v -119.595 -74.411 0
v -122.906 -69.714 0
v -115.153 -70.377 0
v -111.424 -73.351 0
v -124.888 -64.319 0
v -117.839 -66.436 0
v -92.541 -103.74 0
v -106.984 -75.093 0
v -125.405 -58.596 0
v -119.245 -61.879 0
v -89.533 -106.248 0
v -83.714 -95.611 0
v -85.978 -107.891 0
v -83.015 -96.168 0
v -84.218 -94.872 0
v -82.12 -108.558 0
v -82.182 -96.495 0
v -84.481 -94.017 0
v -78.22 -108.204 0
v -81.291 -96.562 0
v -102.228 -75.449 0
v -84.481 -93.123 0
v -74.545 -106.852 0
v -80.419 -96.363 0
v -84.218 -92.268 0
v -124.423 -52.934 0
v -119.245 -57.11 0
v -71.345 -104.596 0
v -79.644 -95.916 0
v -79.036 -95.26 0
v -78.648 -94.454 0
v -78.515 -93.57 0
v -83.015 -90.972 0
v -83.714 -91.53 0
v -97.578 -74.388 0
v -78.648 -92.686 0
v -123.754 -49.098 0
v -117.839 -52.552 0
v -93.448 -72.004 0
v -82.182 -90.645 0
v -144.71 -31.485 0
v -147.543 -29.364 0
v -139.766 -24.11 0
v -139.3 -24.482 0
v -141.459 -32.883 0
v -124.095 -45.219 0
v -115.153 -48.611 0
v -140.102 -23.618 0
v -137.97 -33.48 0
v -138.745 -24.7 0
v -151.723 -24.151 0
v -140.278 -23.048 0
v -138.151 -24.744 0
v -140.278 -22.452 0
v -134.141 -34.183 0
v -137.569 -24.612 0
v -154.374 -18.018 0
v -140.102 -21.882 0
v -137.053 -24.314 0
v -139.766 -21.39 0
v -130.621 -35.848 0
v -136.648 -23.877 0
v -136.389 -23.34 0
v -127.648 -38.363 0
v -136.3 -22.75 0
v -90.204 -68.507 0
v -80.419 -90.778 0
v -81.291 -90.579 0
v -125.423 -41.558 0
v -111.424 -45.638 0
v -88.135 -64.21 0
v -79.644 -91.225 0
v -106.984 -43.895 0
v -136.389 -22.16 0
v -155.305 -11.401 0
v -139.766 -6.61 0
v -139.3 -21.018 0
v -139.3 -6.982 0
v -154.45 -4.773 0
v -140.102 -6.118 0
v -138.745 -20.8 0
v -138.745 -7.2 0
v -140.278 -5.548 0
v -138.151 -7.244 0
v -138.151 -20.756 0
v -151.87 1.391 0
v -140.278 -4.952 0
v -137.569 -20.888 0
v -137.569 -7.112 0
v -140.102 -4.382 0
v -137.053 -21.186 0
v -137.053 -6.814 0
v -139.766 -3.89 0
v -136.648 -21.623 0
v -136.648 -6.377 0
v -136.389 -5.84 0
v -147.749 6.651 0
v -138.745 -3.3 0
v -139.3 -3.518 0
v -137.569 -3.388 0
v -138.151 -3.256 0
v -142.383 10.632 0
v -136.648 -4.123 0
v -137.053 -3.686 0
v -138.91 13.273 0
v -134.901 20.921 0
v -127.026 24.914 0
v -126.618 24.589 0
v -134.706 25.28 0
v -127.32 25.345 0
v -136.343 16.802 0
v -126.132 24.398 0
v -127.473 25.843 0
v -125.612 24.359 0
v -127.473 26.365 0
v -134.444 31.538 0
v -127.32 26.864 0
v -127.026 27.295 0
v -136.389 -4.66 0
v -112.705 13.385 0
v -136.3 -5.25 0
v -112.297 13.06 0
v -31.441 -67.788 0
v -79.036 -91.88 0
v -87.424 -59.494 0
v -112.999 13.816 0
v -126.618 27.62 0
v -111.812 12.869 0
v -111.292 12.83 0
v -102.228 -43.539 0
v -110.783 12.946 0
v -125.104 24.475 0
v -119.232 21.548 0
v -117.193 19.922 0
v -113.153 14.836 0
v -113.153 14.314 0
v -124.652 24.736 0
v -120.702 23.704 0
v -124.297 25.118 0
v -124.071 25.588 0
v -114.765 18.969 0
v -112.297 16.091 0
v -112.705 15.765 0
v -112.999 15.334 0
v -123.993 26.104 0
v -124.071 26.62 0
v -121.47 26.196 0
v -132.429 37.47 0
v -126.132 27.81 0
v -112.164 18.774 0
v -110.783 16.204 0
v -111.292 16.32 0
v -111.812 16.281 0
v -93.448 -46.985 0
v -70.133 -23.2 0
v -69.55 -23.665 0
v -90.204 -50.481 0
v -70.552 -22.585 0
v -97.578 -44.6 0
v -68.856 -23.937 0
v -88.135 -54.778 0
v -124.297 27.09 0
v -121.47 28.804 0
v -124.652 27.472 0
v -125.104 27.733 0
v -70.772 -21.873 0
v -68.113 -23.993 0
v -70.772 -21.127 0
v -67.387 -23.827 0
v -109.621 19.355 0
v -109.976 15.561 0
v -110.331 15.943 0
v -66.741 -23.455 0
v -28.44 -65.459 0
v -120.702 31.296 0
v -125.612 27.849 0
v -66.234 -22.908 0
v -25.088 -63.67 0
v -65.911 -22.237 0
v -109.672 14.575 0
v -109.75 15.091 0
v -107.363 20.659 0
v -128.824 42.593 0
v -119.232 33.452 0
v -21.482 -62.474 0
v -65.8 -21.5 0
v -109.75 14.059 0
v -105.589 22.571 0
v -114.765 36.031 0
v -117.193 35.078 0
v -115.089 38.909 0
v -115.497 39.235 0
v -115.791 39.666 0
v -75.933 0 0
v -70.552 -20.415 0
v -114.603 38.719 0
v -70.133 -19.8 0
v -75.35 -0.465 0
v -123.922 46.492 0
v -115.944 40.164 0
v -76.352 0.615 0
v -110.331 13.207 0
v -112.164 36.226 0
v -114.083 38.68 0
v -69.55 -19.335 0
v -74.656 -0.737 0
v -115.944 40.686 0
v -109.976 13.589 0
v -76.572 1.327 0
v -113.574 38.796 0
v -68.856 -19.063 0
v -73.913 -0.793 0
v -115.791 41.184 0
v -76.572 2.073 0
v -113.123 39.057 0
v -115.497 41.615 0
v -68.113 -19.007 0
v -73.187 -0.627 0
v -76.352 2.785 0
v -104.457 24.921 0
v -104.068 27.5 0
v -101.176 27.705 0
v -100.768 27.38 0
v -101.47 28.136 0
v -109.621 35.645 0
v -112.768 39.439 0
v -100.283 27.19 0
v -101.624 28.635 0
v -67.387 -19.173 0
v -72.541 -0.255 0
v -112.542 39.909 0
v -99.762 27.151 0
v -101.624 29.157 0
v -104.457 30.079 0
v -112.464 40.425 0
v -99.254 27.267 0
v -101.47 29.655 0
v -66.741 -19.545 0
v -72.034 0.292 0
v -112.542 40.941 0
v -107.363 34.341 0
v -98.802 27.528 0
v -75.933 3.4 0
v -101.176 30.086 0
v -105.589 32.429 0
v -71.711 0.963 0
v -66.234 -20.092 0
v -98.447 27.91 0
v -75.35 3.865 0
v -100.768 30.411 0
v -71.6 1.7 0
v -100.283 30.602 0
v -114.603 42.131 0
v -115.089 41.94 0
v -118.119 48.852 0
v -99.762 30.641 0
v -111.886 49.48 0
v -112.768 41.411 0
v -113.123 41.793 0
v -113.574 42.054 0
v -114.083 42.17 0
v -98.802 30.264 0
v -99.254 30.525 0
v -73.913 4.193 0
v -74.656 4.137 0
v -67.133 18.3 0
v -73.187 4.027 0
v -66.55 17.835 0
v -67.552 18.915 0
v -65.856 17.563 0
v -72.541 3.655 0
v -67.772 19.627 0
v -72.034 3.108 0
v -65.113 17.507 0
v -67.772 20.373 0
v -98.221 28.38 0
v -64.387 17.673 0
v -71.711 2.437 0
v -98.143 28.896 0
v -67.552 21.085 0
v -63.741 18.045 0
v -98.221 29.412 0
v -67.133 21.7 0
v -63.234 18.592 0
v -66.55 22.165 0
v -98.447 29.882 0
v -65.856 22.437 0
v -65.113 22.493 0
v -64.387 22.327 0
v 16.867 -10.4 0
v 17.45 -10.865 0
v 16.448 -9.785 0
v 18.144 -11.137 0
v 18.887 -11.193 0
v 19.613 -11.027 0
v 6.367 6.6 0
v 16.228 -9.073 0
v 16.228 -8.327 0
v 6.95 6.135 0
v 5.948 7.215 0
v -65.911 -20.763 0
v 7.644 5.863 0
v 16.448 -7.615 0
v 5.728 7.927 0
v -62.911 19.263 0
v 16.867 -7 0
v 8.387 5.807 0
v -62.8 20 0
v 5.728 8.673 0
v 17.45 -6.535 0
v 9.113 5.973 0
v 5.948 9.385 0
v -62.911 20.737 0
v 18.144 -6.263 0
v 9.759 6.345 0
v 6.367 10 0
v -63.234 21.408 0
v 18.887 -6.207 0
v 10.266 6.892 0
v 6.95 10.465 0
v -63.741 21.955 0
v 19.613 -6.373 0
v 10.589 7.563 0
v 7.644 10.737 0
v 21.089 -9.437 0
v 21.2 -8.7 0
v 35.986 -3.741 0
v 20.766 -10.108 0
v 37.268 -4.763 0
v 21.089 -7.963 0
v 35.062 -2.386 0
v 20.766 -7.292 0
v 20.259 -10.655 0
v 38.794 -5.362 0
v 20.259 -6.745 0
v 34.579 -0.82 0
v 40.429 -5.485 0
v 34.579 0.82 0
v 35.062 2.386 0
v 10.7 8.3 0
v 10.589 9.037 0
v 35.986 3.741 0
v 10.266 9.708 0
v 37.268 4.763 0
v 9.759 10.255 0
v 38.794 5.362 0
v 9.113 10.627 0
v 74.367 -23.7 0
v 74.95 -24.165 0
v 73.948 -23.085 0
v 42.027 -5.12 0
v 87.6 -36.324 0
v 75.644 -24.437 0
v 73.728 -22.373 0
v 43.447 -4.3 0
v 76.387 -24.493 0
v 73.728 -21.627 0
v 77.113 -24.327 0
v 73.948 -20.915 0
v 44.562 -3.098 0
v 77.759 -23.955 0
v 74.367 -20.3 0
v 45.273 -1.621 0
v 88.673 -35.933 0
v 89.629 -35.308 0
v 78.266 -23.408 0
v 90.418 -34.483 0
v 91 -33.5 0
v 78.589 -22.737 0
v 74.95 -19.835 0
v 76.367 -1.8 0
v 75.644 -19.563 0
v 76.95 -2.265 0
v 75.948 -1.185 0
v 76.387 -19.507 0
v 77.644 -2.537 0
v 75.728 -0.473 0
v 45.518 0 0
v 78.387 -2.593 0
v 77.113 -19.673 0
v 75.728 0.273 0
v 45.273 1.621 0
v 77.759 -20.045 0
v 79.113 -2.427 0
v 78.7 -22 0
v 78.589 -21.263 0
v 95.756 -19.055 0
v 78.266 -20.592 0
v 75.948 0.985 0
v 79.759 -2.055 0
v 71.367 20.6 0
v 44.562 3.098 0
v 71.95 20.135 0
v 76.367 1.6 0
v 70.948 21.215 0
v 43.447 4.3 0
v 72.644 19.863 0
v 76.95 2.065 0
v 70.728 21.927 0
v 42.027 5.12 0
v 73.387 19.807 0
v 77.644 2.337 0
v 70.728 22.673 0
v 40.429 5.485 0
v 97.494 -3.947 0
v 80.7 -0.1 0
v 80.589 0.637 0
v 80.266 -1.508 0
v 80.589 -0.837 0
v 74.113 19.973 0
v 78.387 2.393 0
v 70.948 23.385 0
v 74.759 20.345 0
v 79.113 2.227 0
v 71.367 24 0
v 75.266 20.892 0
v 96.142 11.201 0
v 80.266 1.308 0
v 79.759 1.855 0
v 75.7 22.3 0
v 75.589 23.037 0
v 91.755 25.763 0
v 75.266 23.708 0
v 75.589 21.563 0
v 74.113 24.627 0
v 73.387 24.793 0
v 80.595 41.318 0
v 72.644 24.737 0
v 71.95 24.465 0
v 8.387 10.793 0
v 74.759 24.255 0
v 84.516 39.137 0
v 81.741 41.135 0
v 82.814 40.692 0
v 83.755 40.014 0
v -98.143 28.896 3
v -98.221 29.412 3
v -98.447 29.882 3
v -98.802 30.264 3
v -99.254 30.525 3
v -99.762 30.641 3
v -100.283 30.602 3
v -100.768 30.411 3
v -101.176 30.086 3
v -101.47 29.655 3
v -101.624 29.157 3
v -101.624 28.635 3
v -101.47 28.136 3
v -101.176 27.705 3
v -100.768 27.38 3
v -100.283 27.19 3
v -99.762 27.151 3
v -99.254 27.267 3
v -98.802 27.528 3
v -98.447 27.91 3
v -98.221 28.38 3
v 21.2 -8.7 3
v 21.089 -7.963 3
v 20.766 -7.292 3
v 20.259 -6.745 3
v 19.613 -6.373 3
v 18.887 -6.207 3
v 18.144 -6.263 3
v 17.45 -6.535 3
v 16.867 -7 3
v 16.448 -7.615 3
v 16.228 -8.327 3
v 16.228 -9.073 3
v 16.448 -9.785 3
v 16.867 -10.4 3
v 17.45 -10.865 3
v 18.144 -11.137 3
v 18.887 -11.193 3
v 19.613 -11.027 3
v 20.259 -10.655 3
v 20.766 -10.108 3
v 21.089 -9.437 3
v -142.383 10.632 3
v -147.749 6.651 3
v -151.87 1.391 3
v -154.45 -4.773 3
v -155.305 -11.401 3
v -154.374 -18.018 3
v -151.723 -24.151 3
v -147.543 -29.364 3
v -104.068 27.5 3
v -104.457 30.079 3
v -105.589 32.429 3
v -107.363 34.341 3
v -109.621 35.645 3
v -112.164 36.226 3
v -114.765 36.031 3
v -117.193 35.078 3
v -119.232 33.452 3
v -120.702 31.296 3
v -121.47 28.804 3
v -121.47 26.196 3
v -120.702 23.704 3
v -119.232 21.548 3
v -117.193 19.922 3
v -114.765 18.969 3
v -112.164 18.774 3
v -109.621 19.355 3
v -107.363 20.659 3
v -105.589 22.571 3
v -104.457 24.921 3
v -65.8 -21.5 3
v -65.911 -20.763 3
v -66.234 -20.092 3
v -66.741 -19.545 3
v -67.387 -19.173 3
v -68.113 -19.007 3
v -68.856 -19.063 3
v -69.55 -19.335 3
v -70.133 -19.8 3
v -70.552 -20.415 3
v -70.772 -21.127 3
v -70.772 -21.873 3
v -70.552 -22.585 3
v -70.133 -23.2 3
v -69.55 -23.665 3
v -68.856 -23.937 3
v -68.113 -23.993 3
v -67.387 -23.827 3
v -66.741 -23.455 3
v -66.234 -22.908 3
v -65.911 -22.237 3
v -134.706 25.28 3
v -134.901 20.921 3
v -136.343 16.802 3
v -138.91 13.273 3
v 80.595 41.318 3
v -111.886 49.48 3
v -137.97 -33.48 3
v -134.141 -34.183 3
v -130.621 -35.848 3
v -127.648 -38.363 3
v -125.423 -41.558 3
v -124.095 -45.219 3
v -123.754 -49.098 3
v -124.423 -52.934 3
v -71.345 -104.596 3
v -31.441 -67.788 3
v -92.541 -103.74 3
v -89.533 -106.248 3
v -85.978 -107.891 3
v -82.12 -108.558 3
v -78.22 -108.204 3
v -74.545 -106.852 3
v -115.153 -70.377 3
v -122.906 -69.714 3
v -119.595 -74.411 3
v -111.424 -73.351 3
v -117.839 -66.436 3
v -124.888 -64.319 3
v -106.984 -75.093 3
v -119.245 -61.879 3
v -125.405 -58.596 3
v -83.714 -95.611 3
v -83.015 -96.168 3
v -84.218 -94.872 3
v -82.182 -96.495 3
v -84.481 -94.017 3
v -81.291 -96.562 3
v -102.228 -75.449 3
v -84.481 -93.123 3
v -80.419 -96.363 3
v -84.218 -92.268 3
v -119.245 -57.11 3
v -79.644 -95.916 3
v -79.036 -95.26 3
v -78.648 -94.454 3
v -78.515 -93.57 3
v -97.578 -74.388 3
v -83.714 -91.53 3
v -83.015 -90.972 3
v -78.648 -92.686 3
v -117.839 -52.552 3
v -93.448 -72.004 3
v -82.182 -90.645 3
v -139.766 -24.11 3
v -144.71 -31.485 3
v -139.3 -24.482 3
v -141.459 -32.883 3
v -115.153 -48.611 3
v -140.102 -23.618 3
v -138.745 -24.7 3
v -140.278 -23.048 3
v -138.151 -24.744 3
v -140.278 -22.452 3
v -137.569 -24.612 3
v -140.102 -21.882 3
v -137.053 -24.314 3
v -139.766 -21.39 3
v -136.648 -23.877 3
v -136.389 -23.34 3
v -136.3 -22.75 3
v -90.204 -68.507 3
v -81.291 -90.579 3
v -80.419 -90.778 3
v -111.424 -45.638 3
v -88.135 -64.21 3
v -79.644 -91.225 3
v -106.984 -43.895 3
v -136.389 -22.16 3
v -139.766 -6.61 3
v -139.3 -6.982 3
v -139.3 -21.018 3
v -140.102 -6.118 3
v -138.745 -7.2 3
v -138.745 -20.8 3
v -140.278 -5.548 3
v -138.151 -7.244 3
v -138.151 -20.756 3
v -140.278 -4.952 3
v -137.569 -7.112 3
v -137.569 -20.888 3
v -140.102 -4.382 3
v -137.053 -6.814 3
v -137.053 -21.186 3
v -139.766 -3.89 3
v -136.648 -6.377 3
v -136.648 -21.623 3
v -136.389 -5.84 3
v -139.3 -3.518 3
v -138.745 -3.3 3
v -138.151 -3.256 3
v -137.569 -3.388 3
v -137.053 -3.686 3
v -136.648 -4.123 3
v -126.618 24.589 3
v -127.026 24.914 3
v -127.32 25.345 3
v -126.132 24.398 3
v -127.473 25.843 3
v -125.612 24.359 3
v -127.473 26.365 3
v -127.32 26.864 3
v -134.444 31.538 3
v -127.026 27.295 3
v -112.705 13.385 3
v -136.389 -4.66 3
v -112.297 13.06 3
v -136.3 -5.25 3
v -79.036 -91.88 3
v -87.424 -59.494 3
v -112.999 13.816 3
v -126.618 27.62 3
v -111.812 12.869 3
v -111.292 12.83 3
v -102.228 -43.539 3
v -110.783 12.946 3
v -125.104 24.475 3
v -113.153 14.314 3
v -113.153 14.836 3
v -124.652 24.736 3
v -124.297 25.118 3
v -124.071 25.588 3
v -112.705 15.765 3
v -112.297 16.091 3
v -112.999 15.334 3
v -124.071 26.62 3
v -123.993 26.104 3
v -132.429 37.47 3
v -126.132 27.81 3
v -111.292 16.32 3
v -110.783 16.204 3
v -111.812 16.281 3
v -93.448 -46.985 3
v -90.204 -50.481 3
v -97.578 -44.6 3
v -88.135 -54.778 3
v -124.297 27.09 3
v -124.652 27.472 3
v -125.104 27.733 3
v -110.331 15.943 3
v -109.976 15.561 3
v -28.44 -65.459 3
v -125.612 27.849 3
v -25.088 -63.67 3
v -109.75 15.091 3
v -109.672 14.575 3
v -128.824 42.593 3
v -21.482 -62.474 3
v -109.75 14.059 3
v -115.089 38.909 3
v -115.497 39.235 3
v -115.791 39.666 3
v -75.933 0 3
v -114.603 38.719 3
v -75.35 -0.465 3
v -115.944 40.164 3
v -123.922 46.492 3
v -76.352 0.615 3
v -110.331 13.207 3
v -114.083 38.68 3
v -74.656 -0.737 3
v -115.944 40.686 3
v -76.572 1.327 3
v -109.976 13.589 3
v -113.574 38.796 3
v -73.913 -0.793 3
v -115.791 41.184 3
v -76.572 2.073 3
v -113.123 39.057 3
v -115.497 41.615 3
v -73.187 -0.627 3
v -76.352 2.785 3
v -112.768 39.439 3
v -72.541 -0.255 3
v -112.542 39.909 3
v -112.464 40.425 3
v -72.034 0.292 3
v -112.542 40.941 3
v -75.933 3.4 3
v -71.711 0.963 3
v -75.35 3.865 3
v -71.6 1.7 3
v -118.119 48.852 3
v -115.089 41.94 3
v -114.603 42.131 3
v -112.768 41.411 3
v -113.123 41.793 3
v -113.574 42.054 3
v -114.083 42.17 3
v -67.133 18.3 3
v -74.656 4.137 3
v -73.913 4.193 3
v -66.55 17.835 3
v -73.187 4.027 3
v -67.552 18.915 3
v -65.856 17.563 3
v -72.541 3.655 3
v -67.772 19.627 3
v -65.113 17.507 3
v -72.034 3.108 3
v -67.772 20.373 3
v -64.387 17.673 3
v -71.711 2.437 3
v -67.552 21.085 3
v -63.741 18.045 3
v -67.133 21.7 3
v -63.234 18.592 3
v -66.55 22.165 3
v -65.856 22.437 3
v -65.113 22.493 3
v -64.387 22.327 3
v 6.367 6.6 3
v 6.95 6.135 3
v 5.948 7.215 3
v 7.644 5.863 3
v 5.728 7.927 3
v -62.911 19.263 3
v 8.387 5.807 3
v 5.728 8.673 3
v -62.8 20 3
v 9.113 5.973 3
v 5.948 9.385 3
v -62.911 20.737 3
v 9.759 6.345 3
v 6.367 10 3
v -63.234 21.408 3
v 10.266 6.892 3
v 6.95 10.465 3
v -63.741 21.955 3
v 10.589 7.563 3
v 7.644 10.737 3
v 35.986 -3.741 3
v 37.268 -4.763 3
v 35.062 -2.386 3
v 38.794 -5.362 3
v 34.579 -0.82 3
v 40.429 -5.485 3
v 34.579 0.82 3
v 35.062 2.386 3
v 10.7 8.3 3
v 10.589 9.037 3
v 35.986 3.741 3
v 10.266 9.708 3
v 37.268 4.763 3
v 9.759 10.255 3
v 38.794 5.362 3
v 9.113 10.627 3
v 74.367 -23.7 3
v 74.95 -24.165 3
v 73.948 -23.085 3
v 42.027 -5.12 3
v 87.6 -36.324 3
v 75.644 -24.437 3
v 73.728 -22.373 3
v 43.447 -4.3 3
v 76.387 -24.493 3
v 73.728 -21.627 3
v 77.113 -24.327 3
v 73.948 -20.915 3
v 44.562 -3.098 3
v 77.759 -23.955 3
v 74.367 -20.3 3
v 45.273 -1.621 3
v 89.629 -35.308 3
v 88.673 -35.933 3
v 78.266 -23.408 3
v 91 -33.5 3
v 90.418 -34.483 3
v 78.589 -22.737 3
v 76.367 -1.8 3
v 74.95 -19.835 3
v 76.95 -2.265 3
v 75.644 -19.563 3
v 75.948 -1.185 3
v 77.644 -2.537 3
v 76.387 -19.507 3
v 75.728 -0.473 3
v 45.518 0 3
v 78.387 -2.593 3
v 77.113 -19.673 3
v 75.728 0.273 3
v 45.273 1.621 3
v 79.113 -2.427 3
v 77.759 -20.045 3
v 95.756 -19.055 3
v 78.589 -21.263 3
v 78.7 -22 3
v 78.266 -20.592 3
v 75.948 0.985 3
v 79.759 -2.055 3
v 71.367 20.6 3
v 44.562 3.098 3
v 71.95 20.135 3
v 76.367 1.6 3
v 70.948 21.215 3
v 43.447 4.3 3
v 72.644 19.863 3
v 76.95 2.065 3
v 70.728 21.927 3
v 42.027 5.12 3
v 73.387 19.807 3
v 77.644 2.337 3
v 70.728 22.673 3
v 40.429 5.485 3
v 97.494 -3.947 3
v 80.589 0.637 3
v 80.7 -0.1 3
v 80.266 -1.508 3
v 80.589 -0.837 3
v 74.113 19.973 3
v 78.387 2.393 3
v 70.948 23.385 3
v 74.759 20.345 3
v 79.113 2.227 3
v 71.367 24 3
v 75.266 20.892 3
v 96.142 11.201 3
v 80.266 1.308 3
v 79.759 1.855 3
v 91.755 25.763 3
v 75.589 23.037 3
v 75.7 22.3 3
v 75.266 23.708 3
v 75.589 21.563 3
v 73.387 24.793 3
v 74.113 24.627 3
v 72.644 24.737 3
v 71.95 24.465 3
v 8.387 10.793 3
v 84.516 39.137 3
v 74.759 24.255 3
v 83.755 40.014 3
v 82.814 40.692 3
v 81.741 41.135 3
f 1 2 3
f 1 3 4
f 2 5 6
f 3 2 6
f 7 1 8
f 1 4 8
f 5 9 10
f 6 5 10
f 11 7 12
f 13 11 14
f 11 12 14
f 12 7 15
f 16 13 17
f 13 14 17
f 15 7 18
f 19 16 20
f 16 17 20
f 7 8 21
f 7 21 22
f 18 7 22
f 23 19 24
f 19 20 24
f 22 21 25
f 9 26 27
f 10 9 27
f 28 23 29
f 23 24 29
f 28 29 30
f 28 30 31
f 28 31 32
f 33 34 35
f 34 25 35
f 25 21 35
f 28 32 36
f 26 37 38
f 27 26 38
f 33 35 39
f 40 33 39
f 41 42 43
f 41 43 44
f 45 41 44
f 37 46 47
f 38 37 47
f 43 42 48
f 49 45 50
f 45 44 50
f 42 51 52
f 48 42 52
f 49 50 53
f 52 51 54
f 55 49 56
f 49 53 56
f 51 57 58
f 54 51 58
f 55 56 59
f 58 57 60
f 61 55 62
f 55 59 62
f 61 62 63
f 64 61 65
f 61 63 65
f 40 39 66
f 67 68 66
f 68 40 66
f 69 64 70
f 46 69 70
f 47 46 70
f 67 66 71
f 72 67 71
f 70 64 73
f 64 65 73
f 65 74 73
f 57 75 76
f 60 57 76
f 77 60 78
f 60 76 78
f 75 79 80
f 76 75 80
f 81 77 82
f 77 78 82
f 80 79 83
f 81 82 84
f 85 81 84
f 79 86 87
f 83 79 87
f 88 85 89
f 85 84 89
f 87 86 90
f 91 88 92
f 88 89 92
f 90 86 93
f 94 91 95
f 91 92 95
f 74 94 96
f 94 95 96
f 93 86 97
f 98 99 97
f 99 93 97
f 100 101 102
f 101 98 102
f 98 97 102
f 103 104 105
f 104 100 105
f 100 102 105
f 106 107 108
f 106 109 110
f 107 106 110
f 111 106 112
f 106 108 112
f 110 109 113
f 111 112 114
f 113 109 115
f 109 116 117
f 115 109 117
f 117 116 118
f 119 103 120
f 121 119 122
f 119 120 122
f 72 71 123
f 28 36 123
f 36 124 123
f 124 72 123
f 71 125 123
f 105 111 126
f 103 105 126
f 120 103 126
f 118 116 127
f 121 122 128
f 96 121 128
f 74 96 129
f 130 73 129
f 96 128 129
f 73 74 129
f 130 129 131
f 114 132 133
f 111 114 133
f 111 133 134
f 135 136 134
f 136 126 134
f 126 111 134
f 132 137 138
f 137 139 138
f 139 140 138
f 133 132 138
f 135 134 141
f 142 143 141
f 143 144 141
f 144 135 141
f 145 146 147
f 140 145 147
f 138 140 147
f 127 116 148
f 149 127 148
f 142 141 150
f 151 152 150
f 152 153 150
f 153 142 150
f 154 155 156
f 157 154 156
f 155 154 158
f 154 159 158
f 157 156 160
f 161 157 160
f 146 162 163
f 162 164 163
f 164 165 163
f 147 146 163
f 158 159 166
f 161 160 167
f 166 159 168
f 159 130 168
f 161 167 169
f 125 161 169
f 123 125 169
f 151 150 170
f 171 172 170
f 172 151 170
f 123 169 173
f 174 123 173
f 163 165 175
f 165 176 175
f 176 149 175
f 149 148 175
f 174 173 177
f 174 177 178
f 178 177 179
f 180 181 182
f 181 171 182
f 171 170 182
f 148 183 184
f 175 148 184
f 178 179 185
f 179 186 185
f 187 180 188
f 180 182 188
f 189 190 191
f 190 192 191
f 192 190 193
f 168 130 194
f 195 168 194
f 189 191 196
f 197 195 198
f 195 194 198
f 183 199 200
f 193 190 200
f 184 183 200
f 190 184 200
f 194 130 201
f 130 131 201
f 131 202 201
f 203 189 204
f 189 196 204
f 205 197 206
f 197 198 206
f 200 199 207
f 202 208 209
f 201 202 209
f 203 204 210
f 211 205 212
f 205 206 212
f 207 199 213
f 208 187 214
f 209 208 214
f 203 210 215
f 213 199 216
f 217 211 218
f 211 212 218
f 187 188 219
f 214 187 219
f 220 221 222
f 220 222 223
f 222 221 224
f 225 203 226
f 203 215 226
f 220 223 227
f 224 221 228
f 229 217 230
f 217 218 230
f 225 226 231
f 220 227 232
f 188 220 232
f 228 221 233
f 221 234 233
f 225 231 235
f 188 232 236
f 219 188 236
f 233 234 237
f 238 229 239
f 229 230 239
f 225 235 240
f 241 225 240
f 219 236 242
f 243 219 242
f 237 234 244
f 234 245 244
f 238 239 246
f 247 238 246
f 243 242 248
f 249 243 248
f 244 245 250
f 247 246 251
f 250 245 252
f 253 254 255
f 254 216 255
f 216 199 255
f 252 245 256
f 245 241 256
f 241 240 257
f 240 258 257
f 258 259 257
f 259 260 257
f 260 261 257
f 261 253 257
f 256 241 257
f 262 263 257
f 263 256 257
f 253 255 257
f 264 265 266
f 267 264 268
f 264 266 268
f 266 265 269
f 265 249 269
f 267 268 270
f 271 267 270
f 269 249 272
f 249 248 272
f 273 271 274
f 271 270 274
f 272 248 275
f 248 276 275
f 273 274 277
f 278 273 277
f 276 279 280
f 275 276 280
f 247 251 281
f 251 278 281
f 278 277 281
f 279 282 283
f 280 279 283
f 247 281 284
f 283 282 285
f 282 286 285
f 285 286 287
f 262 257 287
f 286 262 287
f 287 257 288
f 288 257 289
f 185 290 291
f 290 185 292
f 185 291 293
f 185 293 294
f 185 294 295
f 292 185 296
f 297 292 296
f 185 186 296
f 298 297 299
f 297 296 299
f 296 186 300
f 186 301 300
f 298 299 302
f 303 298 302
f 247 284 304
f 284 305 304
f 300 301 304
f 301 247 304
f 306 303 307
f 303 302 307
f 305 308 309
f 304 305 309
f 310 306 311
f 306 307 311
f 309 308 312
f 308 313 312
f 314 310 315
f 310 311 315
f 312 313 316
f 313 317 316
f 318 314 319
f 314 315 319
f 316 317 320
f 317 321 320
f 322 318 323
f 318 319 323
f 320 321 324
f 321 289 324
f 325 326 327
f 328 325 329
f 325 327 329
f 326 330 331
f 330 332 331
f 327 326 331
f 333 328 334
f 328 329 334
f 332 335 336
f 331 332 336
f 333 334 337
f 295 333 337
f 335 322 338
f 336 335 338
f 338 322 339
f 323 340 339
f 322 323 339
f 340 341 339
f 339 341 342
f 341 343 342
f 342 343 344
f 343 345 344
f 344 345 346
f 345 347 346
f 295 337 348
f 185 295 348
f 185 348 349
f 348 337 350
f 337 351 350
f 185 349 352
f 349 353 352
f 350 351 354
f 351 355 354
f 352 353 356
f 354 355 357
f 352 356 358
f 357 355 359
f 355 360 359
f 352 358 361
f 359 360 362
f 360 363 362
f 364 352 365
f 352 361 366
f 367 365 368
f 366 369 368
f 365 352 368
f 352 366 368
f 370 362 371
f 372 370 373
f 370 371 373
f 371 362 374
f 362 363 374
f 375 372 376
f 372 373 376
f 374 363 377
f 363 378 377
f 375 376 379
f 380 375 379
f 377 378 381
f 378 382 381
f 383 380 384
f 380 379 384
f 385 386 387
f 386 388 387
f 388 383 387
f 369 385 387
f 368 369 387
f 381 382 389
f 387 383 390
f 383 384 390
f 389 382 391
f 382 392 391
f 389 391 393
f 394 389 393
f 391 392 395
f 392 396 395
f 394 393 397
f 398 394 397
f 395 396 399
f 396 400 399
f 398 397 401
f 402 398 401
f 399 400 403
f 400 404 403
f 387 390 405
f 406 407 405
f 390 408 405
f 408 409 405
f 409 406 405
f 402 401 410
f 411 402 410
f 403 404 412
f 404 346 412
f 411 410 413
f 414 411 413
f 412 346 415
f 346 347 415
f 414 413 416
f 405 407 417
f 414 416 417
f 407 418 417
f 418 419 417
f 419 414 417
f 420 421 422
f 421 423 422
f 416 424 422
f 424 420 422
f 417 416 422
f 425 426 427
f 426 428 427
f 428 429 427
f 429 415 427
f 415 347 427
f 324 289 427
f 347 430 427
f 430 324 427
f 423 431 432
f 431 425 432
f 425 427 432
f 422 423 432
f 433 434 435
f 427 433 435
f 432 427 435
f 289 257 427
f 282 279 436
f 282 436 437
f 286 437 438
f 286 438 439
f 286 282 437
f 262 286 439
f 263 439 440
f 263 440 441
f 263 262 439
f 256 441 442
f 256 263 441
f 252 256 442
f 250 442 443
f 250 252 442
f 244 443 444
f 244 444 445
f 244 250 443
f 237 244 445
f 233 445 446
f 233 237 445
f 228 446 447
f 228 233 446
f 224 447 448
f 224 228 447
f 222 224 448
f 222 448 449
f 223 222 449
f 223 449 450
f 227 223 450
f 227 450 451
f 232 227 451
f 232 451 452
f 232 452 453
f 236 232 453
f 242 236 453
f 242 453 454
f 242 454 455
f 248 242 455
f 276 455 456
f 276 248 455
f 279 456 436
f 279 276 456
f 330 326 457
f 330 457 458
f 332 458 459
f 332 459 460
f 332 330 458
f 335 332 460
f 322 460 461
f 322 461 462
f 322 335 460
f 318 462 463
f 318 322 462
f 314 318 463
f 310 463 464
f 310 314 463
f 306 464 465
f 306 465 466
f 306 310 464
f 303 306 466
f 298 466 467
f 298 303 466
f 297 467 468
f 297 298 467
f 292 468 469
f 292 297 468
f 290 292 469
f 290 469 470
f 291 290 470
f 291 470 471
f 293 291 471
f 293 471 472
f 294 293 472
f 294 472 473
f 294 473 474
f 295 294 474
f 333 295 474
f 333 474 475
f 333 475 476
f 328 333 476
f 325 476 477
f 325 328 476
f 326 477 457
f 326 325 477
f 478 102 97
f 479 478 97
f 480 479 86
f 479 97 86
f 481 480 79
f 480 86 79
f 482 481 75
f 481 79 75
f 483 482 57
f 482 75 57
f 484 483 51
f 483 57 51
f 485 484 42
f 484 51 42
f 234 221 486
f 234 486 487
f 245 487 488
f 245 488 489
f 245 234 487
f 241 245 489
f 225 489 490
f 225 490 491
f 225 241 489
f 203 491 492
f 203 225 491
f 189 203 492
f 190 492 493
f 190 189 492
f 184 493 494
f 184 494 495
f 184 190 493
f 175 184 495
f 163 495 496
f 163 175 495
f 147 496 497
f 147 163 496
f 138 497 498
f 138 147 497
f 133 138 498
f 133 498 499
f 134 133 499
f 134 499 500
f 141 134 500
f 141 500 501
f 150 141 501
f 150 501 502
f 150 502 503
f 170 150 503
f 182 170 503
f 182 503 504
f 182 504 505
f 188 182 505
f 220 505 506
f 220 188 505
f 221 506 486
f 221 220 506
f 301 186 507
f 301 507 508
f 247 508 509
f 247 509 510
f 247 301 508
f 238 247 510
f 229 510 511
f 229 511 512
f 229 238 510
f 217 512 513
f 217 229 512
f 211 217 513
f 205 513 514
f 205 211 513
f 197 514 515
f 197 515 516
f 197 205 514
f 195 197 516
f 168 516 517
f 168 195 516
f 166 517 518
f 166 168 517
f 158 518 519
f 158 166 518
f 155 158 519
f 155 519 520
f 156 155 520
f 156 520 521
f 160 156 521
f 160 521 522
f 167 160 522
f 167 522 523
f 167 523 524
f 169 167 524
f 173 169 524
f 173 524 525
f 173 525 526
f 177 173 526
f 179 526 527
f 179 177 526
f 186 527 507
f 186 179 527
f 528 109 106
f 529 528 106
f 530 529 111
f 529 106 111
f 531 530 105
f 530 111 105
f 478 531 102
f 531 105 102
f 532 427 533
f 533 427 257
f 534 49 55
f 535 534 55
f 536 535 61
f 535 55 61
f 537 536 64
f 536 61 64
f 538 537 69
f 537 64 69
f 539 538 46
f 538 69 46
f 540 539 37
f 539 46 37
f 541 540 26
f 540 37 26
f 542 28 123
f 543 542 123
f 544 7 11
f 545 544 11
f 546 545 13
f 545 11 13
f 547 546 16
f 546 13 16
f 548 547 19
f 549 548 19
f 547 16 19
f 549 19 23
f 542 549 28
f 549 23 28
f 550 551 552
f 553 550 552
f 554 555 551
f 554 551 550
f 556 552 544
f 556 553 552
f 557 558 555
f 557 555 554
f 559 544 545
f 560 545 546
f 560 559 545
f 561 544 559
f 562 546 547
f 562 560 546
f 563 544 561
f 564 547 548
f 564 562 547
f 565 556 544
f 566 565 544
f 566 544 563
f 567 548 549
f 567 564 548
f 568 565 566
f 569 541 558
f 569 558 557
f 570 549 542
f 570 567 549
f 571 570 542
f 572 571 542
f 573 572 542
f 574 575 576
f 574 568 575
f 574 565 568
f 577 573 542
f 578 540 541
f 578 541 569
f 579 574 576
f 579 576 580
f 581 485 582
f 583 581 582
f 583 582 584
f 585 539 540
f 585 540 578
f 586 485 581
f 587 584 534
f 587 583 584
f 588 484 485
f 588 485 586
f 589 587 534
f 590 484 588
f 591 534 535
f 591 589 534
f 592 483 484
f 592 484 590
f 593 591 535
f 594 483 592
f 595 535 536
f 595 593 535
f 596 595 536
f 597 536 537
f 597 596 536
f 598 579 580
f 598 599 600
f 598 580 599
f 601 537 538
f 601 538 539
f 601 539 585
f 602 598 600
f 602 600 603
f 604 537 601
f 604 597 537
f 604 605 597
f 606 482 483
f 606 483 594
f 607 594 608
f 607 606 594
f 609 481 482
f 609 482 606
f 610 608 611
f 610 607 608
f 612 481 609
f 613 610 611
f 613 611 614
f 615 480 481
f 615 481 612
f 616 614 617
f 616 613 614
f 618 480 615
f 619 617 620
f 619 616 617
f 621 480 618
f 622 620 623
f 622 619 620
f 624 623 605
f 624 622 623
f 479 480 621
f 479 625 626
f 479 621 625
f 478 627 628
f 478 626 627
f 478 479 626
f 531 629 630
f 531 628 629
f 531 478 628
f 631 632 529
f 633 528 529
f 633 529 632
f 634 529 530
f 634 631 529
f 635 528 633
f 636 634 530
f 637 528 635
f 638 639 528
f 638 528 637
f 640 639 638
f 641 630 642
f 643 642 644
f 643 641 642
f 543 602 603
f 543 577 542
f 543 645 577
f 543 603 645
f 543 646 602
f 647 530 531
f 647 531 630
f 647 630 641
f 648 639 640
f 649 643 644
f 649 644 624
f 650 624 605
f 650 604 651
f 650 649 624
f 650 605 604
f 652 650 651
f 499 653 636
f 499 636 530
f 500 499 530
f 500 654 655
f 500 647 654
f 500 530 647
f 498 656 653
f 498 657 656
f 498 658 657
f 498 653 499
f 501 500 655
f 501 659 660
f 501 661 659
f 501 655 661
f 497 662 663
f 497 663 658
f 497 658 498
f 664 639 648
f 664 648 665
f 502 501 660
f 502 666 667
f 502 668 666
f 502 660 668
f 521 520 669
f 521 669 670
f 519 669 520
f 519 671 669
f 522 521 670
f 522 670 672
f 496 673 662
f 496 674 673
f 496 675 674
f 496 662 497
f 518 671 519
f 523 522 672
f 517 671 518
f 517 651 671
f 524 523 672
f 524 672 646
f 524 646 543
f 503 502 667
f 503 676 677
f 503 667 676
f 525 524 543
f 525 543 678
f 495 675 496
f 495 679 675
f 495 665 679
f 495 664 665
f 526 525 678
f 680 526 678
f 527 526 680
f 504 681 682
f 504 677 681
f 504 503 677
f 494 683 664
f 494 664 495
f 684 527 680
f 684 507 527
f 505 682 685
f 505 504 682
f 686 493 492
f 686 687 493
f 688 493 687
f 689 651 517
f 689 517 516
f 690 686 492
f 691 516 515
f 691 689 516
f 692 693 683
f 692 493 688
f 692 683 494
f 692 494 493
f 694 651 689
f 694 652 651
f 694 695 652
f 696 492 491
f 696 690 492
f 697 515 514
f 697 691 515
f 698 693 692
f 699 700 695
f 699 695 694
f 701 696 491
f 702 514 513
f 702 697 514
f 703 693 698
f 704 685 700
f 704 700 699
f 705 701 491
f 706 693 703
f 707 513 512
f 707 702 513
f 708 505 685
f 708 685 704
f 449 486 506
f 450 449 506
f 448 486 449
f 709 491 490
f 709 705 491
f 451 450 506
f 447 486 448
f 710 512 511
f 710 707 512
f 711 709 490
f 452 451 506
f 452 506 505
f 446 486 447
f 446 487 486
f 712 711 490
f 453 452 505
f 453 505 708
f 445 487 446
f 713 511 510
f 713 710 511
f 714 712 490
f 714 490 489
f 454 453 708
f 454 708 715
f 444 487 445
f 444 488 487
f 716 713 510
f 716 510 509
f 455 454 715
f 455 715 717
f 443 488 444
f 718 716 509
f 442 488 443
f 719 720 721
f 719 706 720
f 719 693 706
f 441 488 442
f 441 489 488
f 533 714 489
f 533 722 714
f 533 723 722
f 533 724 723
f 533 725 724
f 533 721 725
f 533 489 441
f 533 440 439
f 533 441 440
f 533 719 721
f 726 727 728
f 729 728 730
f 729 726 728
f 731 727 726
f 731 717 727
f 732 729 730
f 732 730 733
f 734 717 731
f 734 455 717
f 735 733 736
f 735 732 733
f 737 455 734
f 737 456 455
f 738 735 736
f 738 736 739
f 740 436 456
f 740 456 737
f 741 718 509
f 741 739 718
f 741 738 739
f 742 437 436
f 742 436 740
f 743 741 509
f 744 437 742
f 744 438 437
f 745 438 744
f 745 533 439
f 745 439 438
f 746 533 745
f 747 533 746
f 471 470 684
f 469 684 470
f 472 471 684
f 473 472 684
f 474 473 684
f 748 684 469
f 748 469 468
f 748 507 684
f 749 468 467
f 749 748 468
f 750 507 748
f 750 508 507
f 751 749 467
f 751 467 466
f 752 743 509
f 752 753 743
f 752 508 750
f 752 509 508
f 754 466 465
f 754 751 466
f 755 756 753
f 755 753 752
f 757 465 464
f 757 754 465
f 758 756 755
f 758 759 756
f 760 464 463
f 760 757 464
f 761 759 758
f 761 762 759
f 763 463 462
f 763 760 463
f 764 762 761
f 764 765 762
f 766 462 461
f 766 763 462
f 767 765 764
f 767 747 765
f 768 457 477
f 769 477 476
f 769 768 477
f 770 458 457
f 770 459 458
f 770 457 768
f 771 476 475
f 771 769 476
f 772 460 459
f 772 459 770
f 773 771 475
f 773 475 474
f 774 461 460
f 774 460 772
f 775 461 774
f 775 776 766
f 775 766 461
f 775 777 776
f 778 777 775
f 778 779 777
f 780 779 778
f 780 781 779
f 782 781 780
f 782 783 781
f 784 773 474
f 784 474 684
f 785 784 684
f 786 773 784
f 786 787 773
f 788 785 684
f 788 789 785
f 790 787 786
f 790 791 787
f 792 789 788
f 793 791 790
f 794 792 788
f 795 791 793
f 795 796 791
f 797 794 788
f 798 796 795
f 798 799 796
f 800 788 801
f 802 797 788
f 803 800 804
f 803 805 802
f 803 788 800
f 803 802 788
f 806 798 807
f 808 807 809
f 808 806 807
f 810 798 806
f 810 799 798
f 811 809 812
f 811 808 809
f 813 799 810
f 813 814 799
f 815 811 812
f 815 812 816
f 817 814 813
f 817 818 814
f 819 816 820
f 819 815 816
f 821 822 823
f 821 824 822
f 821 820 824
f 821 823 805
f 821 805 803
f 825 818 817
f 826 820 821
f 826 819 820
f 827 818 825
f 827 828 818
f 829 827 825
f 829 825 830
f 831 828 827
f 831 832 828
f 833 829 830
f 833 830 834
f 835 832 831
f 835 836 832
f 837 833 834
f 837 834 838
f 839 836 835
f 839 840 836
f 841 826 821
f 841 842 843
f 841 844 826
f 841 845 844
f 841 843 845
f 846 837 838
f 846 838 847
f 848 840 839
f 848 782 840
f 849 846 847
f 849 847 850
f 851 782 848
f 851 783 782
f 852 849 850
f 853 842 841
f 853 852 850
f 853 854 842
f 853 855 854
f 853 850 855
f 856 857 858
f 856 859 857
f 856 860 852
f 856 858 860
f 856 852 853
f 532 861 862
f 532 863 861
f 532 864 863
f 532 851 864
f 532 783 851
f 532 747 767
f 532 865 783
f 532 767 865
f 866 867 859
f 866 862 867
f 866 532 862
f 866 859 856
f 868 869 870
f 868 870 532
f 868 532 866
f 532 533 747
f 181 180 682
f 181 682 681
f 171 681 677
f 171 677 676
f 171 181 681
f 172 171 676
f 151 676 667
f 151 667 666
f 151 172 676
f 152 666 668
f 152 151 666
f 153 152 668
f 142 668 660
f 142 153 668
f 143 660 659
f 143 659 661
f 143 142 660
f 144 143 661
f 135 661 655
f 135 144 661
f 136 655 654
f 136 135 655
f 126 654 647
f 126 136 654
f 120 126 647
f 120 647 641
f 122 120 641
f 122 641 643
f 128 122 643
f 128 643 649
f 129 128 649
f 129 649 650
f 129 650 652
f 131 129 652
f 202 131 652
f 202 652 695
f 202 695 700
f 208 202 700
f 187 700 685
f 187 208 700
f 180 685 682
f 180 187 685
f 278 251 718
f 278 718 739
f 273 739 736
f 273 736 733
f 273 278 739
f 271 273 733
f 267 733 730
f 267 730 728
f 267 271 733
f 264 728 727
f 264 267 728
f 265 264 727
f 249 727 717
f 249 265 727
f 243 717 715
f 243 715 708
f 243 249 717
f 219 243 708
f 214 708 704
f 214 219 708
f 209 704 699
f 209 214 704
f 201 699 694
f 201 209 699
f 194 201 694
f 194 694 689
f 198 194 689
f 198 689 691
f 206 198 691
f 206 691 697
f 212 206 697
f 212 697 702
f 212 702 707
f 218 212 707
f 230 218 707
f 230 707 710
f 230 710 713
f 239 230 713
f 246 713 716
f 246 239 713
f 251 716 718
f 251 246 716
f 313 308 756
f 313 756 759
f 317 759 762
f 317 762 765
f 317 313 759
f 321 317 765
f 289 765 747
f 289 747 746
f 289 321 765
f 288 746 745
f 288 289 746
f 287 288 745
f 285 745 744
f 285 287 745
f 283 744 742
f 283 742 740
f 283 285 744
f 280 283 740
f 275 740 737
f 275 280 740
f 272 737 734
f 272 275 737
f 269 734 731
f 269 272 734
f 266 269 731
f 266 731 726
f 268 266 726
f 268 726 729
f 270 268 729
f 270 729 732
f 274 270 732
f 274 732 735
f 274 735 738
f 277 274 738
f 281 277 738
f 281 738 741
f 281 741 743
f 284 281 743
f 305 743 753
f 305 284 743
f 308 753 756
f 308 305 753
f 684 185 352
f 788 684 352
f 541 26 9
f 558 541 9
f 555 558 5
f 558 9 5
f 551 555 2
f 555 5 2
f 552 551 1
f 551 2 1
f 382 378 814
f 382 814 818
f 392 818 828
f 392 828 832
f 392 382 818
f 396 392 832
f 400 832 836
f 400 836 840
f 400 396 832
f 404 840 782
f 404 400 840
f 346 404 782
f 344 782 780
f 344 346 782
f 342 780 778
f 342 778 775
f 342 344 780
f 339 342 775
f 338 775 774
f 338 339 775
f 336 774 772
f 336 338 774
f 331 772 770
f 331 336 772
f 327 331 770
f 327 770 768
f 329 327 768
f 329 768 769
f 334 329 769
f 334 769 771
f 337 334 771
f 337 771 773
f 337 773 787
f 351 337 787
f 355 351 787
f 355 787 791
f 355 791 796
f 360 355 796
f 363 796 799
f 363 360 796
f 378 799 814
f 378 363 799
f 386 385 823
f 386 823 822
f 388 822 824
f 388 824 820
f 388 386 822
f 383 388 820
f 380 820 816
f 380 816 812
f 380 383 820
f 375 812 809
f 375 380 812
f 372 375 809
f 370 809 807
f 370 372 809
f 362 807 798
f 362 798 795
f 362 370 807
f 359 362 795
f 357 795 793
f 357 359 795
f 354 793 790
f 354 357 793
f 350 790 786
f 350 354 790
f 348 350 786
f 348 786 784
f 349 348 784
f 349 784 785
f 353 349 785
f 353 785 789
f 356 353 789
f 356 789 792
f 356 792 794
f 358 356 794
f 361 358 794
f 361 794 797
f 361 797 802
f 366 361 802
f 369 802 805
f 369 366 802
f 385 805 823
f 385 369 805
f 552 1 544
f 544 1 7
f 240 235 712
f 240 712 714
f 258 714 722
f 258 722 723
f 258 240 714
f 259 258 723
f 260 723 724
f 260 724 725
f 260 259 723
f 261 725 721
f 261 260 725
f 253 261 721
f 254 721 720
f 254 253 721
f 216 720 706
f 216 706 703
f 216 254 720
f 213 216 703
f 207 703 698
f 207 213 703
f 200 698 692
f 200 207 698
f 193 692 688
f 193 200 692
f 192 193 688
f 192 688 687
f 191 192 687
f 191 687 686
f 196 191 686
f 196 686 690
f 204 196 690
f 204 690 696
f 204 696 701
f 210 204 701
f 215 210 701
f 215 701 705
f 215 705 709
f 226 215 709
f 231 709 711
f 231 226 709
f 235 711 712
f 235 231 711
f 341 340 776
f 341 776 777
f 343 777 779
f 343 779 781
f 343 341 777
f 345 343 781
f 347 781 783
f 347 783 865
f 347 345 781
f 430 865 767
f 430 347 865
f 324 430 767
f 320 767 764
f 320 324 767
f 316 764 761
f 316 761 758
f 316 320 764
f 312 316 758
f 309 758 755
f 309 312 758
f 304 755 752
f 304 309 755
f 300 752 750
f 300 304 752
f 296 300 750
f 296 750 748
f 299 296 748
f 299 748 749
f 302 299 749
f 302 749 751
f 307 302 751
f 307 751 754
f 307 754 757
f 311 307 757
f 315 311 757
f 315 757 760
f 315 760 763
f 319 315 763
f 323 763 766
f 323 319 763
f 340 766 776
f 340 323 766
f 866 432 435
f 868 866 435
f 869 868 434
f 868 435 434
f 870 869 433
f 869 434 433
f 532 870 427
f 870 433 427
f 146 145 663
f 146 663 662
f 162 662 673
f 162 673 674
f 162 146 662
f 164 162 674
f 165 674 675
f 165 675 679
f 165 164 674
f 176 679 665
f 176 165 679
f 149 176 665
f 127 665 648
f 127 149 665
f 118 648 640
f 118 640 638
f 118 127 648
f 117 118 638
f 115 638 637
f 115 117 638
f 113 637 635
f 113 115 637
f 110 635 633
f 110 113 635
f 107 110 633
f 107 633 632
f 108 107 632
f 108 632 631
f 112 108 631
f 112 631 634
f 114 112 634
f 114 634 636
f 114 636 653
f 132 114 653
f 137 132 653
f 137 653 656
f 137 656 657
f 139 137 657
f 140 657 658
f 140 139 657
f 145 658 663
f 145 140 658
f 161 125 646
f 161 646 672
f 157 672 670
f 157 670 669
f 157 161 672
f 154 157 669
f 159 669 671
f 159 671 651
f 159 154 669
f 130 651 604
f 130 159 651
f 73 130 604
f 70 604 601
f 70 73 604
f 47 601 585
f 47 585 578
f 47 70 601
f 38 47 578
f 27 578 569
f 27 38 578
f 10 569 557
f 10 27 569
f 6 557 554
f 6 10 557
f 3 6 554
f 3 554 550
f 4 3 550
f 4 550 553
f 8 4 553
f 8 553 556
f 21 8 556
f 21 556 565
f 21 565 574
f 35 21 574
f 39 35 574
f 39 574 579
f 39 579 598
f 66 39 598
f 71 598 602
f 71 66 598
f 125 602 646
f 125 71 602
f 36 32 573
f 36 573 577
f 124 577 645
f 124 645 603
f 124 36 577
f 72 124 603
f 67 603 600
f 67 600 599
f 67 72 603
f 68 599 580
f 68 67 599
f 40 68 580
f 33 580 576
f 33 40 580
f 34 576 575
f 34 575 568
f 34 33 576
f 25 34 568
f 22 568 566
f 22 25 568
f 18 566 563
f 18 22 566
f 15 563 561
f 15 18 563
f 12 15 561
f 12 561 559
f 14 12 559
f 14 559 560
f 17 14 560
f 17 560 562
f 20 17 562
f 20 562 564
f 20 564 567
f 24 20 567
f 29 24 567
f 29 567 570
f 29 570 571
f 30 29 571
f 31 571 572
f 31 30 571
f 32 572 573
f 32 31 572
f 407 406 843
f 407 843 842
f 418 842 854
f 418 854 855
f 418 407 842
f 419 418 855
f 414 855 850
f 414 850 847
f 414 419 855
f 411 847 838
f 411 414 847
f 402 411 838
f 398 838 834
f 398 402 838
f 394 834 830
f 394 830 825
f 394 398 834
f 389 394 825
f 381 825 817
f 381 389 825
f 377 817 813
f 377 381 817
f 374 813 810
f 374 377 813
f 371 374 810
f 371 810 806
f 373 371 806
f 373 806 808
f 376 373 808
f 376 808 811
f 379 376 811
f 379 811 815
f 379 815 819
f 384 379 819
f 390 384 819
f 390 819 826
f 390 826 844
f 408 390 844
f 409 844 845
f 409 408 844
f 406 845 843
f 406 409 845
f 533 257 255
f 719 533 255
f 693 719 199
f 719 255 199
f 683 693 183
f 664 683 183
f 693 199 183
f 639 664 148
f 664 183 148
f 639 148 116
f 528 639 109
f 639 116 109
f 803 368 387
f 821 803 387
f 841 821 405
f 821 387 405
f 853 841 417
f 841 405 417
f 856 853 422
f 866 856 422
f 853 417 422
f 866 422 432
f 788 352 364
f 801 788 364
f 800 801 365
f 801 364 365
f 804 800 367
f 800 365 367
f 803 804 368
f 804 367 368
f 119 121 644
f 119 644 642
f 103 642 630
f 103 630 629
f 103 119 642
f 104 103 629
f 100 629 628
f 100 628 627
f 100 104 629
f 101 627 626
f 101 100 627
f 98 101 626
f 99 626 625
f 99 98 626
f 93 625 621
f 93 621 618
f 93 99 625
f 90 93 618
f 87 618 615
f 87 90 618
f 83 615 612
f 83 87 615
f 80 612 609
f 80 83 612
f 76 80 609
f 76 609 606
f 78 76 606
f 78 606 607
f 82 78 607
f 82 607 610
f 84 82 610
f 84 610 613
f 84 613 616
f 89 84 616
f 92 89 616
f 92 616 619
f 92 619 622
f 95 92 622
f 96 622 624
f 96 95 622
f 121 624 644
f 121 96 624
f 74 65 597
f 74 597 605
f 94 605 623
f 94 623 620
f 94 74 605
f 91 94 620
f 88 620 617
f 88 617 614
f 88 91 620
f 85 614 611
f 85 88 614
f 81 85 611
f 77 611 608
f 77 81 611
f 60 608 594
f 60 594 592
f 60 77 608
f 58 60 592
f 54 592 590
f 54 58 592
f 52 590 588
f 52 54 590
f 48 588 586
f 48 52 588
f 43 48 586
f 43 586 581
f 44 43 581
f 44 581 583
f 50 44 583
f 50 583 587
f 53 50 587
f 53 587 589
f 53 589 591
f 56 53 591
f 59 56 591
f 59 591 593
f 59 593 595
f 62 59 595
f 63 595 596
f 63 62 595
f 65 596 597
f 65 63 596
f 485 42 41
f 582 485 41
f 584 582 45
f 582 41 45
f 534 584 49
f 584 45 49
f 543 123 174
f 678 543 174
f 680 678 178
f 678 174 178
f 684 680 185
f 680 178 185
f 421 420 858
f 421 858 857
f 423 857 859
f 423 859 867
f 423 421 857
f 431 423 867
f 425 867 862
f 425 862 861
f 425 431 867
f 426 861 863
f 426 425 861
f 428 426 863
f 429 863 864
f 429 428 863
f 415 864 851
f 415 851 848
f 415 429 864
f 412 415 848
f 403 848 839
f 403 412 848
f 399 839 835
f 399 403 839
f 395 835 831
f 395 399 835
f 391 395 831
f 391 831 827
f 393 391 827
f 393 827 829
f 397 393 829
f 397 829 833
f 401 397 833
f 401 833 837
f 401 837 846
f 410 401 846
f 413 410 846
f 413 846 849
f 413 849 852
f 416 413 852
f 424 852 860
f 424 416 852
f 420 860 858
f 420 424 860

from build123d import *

# Parameters (mm, degrees)
SKETCH1_R           = 3
SKETCH1_R_2         = 2
SKETCH1_R_3         = 2.5
SKETCH1_R_4         = 1.75
SKETCH1_R_5         = 8.75
SKETCH1_R_6         = 5.5
SKETCH1_R_7         = 16
BOSS_EXTRUDE1_DEPTH = 3


with BuildPart() as part:
    # Sketch1 → Boss-Extrude1 (new body)
    with BuildSketch(Plane.XY):
        with BuildLine():
            ThreePointArc((-111.886028634, 49.480245878), (-128.824449864, 42.592956949), (-134.705774542, 25.279526249))
            ThreePointArc((-134.705774542, 25.279526249), (-136.343375771, 16.802270376), (-142.382746132, 10.632050724))
            ThreePointArc((-142.382746132, 10.632050724), (-155.099864059, -8.058287742), (-147.542861296, -29.364285714))
            ThreePointArc((-147.542861296, -29.364285714), (-143.125485566, -32.280163581), (-137.970351553, -33.480224156))
            ThreePointArc((-137.970351553, -33.480224156), (-126.431132561, -39.888203569), (-124.422839539, -52.93360637))
            ThreePointArc((-124.422839539, -52.93360637), (-124.888175134, -64.31939994), (-119.594822483, -74.410646153))
            Line((-119.594822483, -74.410646153), (-92.540517723, -103.740413224))
            ThreePointArc((-92.540517723, -103.740413224), (-82.119700521, -108.557935129), (-71.344567605, -104.595807028))
            Line((-71.344567605, -104.595807028), (-31.441449774, -67.788453323))
            ThreePointArc((-31.441449774, -67.788453323), (-26.802171393, -64.493076397), (-21.481893225, -62.473904985))
            Line((-21.481893225, -62.473904985), (87.599861039, -36.324111832))
            ThreePointArc((87.599861039, -36.324111832), (89.628937626, -35.308169791), (91, -33.5))
            ThreePointArc((91, -33.5), (97.203558128, 3.661751943), (84.51565505, 39.137054004))
            ThreePointArc((84.51565505, 39.137054004), (82.813644384, 40.69192784), (80.594954641, 41.317938046))
            Line((80.594954641, 41.317938046), (-111.886028634, 49.480245878))
        make_face()
        with Locations((-81.514845762, -93.570135067)):
            Circle(SKETCH1_R, mode=Mode.SUBTRACT)
        with Locations((-138.3, -22.75)):
            Circle(SKETCH1_R_2, mode=Mode.SUBTRACT)
        with Locations((-138.3, -5.25)):
            Circle(SKETCH1_R_2, mode=Mode.SUBTRACT)
        with Locations((-68.3, -21.5)):
            Circle(SKETCH1_R_3, mode=Mode.SUBTRACT)
        with Locations((-74.1, 1.7)):
            Circle(SKETCH1_R_3, mode=Mode.SUBTRACT)
        with Locations((-111.422396488, 14.575141755)):
            Circle(SKETCH1_R_4, mode=Mode.SUBTRACT)
        with Locations((-125.742976533, 26.1042782)):
            Circle(SKETCH1_R_4, mode=Mode.SUBTRACT)
        with Locations((-112.818118288, 27.5)):
            Circle(SKETCH1_R_5, mode=Mode.SUBTRACT)
        with Locations((-114.213840088, 40.424858245)):
            Circle(SKETCH1_R_4, mode=Mode.SUBTRACT)
        with Locations((-99.893260043, 28.8957218)):
            Circle(SKETCH1_R_4, mode=Mode.SUBTRACT)
        with Locations((-65.3, 20)):
            Circle(SKETCH1_R_3, mode=Mode.SUBTRACT)
        with Locations((18.7, -8.7)):
            Circle(SKETCH1_R_3, mode=Mode.SUBTRACT)
        with Locations((76.2, -22)):
            Circle(SKETCH1_R_3, mode=Mode.SUBTRACT)
        with Locations((40.017782272, 0)):
            Circle(SKETCH1_R_6, mode=Mode.SUBTRACT)
        with Locations((78.2, -0.1)):
            Circle(SKETCH1_R_3, mode=Mode.SUBTRACT)
        with Locations((8.2, 8.3)):
            Circle(SKETCH1_R_3, mode=Mode.SUBTRACT)
        with Locations((73.2, 22.3)):
            Circle(SKETCH1_R_3, mode=Mode.SUBTRACT)
        with Locations((-103.42383694, -59.494238188)):
            Circle(SKETCH1_R_7, mode=Mode.SUBTRACT)
    extrude(amount=BOSS_EXTRUDE1_DEPTH)


solid = part.part
